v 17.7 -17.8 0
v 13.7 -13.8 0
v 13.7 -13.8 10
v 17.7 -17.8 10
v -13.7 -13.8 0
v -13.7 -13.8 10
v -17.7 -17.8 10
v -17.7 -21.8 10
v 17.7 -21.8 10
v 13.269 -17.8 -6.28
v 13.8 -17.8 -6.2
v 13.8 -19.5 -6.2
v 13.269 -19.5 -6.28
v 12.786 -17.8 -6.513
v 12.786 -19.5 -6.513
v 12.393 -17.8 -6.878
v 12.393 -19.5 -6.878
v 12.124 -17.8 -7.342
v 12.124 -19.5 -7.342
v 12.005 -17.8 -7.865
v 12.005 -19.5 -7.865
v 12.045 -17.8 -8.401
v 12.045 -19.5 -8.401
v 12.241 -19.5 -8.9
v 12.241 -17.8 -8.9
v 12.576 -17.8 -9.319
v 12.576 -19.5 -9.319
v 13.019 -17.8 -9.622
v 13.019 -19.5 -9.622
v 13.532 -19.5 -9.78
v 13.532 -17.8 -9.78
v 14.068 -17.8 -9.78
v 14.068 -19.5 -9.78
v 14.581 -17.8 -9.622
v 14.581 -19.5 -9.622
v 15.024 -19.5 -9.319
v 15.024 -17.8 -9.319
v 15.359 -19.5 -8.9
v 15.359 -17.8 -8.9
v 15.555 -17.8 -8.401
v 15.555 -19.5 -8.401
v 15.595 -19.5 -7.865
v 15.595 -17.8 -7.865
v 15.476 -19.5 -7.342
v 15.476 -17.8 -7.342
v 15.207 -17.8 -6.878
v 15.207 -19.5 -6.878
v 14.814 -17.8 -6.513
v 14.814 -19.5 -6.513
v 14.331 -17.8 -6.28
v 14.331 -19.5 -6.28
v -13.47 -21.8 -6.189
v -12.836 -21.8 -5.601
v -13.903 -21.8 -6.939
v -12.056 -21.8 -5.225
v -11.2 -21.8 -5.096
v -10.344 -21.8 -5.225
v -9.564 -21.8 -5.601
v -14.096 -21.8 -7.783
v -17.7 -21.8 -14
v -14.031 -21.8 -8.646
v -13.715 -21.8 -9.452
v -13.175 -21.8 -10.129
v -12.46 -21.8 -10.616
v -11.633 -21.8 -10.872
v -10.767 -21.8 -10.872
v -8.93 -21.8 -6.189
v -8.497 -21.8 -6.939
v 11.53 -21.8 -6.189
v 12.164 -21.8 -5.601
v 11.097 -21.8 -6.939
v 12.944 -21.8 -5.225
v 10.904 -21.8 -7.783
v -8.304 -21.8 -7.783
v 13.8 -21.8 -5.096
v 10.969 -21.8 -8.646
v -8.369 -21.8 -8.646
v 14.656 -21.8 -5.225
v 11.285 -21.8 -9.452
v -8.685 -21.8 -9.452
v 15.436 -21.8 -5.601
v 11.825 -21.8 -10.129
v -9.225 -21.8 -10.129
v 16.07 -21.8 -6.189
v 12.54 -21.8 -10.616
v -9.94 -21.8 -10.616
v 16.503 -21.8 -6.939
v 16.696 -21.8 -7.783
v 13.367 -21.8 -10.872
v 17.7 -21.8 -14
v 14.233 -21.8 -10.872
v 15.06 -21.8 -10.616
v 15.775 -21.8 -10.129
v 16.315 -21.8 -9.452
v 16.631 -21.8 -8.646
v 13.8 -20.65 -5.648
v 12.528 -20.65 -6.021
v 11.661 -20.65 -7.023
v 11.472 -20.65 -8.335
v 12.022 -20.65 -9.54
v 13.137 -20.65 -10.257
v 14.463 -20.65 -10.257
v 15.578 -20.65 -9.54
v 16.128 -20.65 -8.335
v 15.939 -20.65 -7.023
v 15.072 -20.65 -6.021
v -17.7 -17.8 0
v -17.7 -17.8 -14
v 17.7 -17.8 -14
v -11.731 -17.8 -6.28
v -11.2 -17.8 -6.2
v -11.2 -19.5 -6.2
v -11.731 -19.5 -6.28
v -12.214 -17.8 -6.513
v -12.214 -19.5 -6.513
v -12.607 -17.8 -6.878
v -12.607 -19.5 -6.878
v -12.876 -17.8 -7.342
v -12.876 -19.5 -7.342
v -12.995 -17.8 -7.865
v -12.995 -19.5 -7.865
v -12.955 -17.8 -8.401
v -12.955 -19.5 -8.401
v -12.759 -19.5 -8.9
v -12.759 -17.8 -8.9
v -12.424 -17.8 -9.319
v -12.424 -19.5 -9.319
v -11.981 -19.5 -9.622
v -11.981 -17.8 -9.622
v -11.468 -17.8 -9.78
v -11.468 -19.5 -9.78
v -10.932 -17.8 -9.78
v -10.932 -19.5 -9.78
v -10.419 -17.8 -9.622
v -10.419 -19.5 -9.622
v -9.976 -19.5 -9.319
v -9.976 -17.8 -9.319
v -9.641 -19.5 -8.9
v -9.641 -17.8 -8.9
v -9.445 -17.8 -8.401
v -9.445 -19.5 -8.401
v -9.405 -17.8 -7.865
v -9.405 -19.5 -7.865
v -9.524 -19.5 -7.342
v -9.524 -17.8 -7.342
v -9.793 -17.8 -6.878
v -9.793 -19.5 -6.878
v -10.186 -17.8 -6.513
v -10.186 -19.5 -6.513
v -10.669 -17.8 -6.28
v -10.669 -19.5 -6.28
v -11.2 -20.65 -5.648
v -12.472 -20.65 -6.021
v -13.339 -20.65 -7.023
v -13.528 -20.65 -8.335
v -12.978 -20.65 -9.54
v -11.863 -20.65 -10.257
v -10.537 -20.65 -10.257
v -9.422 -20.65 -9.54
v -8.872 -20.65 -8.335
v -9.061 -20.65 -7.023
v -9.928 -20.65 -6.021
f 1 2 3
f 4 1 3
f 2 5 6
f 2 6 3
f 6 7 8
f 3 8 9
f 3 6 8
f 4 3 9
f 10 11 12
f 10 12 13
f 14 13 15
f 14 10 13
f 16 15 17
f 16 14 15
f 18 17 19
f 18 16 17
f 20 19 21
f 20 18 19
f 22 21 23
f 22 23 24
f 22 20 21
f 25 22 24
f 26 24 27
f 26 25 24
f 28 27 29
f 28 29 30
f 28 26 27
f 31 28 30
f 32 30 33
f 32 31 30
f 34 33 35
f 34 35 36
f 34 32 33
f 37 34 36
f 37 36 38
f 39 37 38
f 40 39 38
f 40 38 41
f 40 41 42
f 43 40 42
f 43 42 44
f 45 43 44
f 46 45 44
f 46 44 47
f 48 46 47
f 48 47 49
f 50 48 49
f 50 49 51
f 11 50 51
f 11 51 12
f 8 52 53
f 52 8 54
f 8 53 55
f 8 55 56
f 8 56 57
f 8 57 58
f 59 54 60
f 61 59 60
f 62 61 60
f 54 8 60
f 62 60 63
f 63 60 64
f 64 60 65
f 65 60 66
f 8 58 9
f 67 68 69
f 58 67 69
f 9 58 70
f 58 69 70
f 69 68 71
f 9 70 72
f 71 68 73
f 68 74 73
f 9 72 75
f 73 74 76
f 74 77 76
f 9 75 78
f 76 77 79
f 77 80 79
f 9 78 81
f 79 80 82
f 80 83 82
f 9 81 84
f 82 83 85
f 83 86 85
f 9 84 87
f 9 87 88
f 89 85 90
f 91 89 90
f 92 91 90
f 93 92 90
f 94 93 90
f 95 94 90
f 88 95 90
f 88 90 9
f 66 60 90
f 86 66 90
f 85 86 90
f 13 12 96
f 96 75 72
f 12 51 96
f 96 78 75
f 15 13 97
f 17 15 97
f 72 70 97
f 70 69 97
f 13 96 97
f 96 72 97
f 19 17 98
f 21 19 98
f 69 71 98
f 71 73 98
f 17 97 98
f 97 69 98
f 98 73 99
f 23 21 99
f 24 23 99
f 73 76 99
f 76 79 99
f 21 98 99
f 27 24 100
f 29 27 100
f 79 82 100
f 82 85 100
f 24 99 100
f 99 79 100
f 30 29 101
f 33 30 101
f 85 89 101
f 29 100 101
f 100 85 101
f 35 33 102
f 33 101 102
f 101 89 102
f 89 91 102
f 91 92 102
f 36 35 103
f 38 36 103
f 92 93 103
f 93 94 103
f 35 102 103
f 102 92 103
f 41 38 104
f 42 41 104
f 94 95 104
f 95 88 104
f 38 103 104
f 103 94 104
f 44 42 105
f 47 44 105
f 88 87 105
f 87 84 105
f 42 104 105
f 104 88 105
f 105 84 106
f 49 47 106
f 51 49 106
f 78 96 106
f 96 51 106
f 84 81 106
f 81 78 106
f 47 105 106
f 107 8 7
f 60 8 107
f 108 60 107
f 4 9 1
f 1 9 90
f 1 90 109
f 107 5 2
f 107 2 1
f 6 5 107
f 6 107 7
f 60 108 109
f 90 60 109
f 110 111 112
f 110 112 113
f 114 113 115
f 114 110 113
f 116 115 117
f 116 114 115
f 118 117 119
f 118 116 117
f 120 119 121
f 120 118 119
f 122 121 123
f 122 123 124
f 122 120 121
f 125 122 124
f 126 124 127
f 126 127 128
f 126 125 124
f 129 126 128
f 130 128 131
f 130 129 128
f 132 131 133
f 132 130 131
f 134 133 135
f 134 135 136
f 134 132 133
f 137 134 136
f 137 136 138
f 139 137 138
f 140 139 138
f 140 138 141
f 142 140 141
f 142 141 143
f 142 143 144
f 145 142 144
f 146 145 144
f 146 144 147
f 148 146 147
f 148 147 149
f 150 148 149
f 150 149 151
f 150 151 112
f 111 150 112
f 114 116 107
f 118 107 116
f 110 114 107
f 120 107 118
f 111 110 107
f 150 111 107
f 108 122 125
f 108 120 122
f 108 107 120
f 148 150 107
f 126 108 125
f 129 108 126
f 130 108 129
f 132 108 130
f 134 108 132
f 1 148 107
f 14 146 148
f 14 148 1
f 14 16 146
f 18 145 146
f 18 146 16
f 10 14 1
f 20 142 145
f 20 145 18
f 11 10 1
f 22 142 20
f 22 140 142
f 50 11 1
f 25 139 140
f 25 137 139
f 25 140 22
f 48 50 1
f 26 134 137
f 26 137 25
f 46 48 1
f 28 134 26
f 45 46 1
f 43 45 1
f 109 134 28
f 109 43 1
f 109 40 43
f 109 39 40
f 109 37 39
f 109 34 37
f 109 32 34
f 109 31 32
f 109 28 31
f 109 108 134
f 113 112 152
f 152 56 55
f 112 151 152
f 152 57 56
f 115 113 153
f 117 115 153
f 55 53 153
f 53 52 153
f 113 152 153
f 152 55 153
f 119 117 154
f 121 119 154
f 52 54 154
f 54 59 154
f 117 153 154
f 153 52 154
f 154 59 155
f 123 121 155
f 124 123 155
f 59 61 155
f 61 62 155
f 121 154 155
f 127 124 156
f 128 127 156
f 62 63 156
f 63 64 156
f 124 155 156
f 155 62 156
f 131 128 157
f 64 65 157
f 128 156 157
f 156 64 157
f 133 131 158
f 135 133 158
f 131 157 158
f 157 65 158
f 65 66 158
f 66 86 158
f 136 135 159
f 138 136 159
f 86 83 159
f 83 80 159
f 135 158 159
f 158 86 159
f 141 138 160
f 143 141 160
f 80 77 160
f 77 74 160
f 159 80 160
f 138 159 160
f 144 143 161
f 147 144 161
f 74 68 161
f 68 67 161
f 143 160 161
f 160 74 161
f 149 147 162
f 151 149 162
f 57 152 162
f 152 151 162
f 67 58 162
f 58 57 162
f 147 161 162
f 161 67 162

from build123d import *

# Parameters (mm, degrees)
BOX054_W                = 35.4
BOX054_H                = 8
BOX054_DEPTH            = 10
CHAMFER005_SIZE         = 4
CYLINDER109_R           = 1.8
CYLINDER109_DEPTH       = 10
BODY054_PLACEMENT_ANGLE = 90
ARRAY001047_Y_COUNT     = 2
ARRAY001047_Y_PITCH     = 25
ARRAY001047_Z_COUNT     = 3
ARRAY001047_Z_PITCH     = 20
BODY055_PLACEMENT_ANGLE = 90
BOX053_W                = 35.4
BOX053_H                = 4
BOX053_DEPTH            = 24


with BuildPart() as chamfer005:
    # Box054 → Box054 (new body)
    with BuildSketch(Plane(origin=(-17.7, -21.8, 0), x_dir=(1, 0, 0), z_dir=(0, 0, 1))):
        with Locations((17.7, 4)):
            Rectangle(BOX054_W, BOX054_H)
    extrude(amount=BOX054_DEPTH)

    # Chamfer005
    chamfer005_edges = [chamfer005.edges().sort_by_distance(p)[0] for p in [
        (-17.7, -13.8, 5),
        (17.7, -13.8, 5),
    ]]
    chamfer(chamfer005_edges, length=CHAMFER005_SIZE)


with BuildPart() as cone:
    # Cone → Cone (revolve)
    with BuildSketch(Plane(origin=(0, 0, 7.5), x_dir=(1, 0, 0), z_dir=(0, -1, 0))):
        Polygon((0, 0), (1.8, 0), (3, 2.5), (0, 2.5), align=None)
    revolve(axis=Axis((0, 0, 7.5), (0, 0, 1)))


with BuildPart() as top_screw_hole_array_clone:
    # Cylinder109 → Cylinder109 (new body)
    with BuildSketch(Plane.XY):
        Circle(CYLINDER109_R)
    extrude(amount=CYLINDER109_DEPTH)

    # Fusion085: union Cone
    add(cone.part)


with BuildPart() as top_screw_hole_array_clone_1:
    # Body054 placement: moved
    add(top_screw_hole_array_clone.part.rotate(Axis((0, 0, 0), (0, -1, 0)), BODY054_PLACEMENT_ANGLE))

    # Array001047 Y: top screw hole array clone ×2


with BuildPart() as top_screw_hole_array_clone_2:
    add(top_screw_hole_array_clone_1.part)
    with Locations(*[(0, i * ARRAY001047_Y_PITCH, 0) for i in range(1, ARRAY001047_Y_COUNT)]):
        add(top_screw_hole_array_clone_1.part)

    # Array001047 Z: top screw hole array clone ×3


with BuildPart() as top_screw_hole_array_clone_3:
    add(top_screw_hole_array_clone_2.part)
    with Locations(*[(0, 0, i * ARRAY001047_Z_PITCH) for i in range(1, ARRAY001047_Z_COUNT)]):
        add(top_screw_hole_array_clone_2.part)


with BuildPart() as top_screw_hole_array_clone_4:
    # Array001047 placement: moved
    add(top_screw_hole_array_clone_3.part.moved(Location((0, 4, 35))))


with BuildPart() as top_screw_hole_array_clone_5:
    # Body055 placement: moved
    add(top_screw_hole_array_clone_4.part.moved(Location((17.8, -12, -83))).rotate(Axis((17.8, -12, -83), (0, 0, 1)), BODY055_PLACEMENT_ANGLE))


with BuildPart() as fusion084:
    # Box053 → Box053 (new body)
    with BuildSketch(Plane(origin=(-17.7, -21.8, -14), x_dir=(1, 0, 0), z_dir=(0, 0, 1))):
        with Locations((17.7, 2)):
            Rectangle(BOX053_W, BOX053_H)
    extrude(amount=BOX053_DEPTH)

    # Cut023020: cut top screw hole array clone
    add(top_screw_hole_array_clone_5.part, mode=Mode.SUBTRACT)

    # Fusion084: union Chamfer005
    add(chamfer005.part)


solid = fusion084.part
